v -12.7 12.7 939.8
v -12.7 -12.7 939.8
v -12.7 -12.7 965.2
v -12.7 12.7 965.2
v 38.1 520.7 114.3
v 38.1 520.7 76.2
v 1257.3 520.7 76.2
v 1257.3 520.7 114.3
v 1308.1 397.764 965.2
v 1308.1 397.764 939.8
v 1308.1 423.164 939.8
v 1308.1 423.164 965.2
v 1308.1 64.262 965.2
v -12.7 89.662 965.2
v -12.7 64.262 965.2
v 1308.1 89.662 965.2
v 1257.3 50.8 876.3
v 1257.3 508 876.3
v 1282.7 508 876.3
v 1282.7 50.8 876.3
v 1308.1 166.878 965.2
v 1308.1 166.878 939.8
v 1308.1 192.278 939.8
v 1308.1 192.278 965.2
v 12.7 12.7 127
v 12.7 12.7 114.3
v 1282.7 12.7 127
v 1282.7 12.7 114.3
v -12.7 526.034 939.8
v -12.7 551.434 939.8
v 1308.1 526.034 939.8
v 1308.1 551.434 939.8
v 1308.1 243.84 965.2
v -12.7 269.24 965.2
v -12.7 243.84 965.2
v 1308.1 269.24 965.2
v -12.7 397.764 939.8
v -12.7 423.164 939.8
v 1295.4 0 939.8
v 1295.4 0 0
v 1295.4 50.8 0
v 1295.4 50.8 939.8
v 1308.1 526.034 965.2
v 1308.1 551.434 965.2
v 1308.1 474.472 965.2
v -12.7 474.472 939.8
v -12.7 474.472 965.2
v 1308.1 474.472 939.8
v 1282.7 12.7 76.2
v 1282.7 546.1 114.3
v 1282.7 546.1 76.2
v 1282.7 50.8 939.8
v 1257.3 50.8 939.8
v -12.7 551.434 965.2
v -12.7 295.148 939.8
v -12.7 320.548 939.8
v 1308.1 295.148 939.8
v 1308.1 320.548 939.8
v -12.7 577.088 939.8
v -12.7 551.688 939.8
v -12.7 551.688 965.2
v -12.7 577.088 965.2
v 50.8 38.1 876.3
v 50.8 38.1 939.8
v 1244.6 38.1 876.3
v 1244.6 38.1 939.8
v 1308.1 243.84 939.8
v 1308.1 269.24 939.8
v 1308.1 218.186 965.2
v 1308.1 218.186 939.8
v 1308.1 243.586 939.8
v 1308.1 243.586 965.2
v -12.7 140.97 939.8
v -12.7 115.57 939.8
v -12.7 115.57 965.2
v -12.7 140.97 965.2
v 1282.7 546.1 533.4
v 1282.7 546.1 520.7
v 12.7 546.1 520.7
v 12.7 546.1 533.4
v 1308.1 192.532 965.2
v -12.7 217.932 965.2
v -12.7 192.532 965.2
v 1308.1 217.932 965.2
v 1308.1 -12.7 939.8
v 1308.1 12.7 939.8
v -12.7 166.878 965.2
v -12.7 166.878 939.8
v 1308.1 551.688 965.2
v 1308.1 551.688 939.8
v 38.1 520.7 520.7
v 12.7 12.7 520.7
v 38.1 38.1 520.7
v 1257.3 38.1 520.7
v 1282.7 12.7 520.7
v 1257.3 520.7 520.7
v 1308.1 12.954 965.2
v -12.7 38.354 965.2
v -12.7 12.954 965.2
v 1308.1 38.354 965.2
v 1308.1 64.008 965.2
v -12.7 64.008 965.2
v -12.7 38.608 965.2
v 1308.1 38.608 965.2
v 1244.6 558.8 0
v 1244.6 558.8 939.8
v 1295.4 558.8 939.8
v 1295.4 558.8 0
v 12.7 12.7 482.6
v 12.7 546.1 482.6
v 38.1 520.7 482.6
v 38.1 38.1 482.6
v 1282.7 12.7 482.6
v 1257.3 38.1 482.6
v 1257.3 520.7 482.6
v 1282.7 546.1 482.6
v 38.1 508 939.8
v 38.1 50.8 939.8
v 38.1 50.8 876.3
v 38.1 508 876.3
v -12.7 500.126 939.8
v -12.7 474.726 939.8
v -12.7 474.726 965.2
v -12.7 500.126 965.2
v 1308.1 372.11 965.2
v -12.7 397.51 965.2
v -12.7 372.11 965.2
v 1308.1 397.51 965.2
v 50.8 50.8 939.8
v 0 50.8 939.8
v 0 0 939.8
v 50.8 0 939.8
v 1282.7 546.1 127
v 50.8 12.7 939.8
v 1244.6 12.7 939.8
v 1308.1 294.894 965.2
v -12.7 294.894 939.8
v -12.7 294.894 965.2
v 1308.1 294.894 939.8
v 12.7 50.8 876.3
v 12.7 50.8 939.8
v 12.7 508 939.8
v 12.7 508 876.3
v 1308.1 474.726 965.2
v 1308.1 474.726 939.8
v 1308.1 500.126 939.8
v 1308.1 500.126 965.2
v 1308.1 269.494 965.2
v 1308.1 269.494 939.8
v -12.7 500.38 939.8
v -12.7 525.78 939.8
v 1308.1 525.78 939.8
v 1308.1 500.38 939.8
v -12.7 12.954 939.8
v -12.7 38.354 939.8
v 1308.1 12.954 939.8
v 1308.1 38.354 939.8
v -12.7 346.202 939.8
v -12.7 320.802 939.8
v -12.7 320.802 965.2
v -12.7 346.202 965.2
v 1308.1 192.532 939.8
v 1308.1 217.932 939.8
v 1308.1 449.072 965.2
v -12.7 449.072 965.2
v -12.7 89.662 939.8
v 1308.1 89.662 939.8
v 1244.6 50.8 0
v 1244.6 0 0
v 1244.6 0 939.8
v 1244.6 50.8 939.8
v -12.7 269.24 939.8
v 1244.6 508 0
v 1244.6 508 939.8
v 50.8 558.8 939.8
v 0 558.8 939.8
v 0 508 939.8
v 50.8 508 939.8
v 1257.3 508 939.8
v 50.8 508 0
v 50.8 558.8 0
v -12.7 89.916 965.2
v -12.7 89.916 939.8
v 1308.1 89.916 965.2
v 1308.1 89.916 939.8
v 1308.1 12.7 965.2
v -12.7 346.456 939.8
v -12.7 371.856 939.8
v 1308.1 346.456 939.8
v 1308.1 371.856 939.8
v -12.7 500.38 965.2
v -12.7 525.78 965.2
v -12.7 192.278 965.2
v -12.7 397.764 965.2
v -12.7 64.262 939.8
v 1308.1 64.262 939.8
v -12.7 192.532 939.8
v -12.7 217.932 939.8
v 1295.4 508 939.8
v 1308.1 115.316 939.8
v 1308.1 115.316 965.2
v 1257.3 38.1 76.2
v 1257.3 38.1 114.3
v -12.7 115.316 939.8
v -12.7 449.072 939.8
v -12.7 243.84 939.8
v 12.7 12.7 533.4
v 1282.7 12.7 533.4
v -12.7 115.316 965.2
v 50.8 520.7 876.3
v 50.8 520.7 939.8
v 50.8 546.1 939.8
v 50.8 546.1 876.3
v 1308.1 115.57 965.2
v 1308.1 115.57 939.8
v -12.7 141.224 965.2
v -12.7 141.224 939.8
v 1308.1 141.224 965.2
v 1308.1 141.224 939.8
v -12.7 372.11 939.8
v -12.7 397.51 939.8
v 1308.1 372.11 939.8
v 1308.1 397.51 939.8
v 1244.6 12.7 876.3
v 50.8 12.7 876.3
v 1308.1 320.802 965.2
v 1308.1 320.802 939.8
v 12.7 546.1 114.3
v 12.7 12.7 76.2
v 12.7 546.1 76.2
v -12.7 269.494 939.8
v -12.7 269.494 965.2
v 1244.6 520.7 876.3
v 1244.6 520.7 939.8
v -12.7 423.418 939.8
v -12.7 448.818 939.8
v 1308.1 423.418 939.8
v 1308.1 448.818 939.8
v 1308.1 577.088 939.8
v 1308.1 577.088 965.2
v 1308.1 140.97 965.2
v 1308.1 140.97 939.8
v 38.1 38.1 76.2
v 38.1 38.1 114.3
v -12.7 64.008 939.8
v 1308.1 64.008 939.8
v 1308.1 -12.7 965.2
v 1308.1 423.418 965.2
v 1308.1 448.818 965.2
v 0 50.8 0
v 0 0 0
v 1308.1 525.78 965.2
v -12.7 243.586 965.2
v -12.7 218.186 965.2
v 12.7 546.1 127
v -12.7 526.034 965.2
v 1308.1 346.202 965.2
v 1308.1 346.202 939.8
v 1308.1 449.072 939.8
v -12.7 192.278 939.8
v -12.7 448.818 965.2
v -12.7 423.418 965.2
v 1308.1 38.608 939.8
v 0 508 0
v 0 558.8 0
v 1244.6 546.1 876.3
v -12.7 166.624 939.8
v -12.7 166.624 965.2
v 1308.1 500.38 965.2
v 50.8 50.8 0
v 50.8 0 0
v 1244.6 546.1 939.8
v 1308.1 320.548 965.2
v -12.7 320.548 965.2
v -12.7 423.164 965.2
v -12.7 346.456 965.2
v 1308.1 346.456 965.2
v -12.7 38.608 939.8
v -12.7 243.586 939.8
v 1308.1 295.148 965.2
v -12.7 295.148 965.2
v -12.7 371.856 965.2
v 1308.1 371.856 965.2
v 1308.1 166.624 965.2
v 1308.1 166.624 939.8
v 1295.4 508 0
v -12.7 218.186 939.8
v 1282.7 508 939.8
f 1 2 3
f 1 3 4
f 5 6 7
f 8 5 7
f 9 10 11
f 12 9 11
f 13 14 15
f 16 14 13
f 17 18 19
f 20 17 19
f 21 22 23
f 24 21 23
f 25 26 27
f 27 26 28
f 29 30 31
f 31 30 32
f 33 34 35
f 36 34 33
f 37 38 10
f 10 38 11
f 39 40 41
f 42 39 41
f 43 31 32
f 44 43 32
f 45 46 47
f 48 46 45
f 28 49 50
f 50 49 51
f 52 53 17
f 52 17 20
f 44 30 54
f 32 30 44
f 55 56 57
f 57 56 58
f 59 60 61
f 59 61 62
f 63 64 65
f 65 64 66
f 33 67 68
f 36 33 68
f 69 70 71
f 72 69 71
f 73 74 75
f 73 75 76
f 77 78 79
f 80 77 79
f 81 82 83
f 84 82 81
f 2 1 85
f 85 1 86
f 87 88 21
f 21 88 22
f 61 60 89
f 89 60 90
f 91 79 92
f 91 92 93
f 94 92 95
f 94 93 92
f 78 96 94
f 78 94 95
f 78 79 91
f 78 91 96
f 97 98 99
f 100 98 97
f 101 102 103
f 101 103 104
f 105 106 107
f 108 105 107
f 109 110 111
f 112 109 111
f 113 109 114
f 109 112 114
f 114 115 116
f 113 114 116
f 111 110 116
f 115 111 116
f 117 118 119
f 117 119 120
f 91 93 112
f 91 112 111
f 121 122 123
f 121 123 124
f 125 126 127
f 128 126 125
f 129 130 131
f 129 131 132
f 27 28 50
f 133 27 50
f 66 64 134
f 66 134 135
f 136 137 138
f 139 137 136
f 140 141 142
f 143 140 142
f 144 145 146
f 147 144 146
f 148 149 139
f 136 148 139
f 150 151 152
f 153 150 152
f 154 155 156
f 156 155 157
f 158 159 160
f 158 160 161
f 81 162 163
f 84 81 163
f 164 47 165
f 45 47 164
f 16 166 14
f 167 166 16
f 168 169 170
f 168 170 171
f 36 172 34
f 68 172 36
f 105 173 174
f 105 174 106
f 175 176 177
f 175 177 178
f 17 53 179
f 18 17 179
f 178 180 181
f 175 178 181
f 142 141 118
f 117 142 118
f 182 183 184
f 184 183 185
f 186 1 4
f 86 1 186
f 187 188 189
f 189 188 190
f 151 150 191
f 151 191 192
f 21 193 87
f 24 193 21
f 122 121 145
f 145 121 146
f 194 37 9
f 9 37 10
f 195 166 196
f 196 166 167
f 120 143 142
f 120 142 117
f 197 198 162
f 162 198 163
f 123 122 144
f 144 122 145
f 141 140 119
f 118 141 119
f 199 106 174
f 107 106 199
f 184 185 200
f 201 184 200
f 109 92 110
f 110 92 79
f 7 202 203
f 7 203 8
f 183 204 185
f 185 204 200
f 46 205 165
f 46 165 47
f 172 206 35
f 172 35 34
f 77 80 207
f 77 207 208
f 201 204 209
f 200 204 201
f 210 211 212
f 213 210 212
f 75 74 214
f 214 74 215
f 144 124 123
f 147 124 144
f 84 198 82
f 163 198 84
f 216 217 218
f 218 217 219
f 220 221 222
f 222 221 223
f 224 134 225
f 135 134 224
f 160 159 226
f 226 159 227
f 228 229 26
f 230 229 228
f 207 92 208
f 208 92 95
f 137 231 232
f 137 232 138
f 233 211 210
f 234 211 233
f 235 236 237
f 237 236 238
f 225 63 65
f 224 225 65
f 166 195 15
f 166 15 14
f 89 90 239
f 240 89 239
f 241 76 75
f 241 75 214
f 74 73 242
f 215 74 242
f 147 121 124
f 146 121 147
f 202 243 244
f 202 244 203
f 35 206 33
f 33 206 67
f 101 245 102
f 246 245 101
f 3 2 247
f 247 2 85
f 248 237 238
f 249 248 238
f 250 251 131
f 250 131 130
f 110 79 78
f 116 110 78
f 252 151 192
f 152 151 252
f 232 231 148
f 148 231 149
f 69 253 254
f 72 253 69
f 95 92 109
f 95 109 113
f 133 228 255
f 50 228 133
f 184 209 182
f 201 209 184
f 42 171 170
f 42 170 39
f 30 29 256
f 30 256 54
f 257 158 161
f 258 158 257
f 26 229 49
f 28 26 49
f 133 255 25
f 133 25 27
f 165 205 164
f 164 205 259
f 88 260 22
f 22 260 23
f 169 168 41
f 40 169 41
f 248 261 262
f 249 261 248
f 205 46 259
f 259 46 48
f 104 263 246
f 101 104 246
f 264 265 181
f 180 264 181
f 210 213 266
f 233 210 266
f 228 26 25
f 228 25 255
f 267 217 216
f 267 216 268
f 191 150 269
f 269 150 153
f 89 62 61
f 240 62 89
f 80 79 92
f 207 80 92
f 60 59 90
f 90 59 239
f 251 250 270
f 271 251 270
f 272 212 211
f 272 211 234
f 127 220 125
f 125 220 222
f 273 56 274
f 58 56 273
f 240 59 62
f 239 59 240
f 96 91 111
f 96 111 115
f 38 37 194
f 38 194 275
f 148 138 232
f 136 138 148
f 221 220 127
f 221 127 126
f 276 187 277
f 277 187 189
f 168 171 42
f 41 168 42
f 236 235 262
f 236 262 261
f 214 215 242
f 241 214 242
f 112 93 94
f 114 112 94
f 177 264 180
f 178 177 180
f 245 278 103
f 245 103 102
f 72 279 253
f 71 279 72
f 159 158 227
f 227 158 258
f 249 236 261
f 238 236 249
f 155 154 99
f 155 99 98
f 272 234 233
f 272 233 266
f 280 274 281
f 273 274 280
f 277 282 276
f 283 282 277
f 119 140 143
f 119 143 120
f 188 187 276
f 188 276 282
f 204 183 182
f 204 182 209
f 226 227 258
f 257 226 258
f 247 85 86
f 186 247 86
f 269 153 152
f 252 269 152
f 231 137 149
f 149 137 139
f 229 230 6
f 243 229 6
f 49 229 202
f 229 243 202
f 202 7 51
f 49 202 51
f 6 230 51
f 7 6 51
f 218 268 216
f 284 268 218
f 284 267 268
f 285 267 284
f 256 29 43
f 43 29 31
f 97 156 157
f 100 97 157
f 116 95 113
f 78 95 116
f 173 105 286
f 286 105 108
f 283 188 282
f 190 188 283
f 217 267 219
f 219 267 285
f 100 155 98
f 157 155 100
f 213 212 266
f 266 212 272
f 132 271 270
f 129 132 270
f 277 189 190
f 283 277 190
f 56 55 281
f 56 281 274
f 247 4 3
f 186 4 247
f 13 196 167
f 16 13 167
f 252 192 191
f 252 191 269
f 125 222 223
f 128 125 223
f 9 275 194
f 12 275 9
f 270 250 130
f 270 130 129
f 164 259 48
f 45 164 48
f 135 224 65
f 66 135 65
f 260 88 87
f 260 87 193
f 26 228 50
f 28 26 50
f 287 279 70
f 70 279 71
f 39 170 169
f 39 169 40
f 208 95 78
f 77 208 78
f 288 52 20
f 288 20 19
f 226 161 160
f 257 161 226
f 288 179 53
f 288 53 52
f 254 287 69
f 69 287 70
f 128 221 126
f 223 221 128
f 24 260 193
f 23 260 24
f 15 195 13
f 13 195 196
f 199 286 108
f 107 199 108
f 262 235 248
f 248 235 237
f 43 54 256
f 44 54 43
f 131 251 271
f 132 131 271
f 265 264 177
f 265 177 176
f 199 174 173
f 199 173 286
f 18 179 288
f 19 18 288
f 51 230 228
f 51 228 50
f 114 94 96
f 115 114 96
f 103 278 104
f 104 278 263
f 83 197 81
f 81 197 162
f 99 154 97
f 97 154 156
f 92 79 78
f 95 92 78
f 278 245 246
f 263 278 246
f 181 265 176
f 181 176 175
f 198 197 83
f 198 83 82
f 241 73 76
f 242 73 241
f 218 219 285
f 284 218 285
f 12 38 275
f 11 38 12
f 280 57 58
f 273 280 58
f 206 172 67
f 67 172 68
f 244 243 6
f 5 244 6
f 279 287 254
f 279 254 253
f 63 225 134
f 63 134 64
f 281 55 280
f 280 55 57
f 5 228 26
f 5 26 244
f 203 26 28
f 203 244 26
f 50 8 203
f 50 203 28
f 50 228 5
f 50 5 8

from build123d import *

# Parameters (mm, degrees)
F0_W      = 50.8
F0_H      = 50.8
F1_DEPTH  = 939.8
F2_W      = 1193.8
F2_H      = 25.4
F3_DEPTH  = 63.5
F2_W_2    = 25.4
F2_H_2    = 457.2
F5_W      = 1270
F5_H      = 533.4
F5_W_2    = 1219.2
F5_H_2    = 482.6
F6_DEPTH  = 38.1
F7_W      = 1270
F7_H      = 533.4
F8_DEPTH  = 12.7
F10_W     = 1270
F10_H     = 533.4
F10_W_2   = 1219.2
F10_H_2   = 482.6
F11_DEPTH = 38.1
F13_W     = 1320.8
F13_H     = 25.4
F14_DEPTH = 25.4
F12_W     = 1219.2
F12_H     = 482.6
F15_DEPTH = 12.7


# Not quite as in the source:
# - ends of sketch curves that miss each other by under 0.0002 mm in the source are joined


with BuildPart() as f1:
    # F0 (on Top) → F1 (new body)
    with BuildSketch(Plane.XY):
        with Locations((25.4, 25.4)):
            Rectangle(F0_W, F0_H)
    extrude(amount=F1_DEPTH)


with BuildPart() as f1b:
    # F0 (on Top) → F1, piece 2 (new body)
    with BuildSketch(Plane.XY):
        with Locations((25.4, 533.4)):
            Rectangle(F0_W, F0_H)
    extrude(amount=F1_DEPTH)


with BuildPart() as f1c:
    # F0 (on Top) → F1, piece 3 (new body)
    with BuildSketch(Plane.XY):
        with Locations((1270, 25.4)):
            Rectangle(F0_W, F0_H)
    extrude(amount=F1_DEPTH)


with BuildPart() as f1d:
    # F0 (on Top) → F1, piece 4 (new body)
    with BuildSketch(Plane.XY):
        with Locations((1270, 533.4)):
            Rectangle(F0_W, F0_H)
    extrude(amount=F1_DEPTH)


with BuildPart() as f3:
    # F2 (on face) → F3 (new body)
    with BuildSketch(Plane.XY.offset(939.8)):
        with Locations((647.7, 533.4)):
            Rectangle(F2_W, F2_H)
    extrude(amount=-F3_DEPTH)


with BuildPart() as f3b:
    # F2 (on face) → F3, piece 2 (new body)
    with BuildSketch(Plane.XY.offset(939.8)):
        with Locations((647.7, 25.4)):
            Rectangle(F2_W, F2_H)
    extrude(amount=-F3_DEPTH)


with BuildPart() as f3c:
    # F2 (on face) → F3, piece 3 (new body)
    with BuildSketch(Plane.XY.offset(939.8)):
        with Locations((25.4, 279.4)):
            Rectangle(F2_W_2, F2_H_2)
    extrude(amount=-F3_DEPTH)


with BuildPart() as f3d:
    # F2 (on face) → F3, piece 4 (new body)
    with BuildSketch(Plane.XY.offset(939.8)):
        with Locations((1270, 279.4)):
            Rectangle(F2_W_2, F2_H_2)
    extrude(amount=-F3_DEPTH)


with BuildPart() as f6:
    # F5 (on offset) → F6 (new body)
    with BuildSketch(Plane.XY.offset(76.2)):
        with Locations((647.7, 279.4)):
            Rectangle(F5_W, F5_H)
        with Locations((647.7, 279.4)):
            Rectangle(F5_W_2, F5_H_2, mode=Mode.SUBTRACT)
    extrude(amount=F6_DEPTH)


with BuildPart() as f8:
    # F7 (on face) → F8 (new body)
    with BuildSketch(Plane.XY.offset(114.3)):
        with Locations((647.7, 279.4)):
            Rectangle(F7_W, F7_H)
    extrude(amount=F8_DEPTH)


with BuildPart() as f11:
    # F10 (on offset) → F11 (new body)
    with BuildSketch(Plane.XY.offset(520.7)):
        with Locations((647.7, 279.4)):
            Rectangle(F10_W, F10_H)
        with Locations((647.7, 279.4)):
            Rectangle(F10_W_2, F10_H_2, mode=Mode.SUBTRACT)
    extrude(amount=-F11_DEPTH)


with BuildPart() as f14:
    # F13 (on face) → F14 (new body)
    with BuildSketch(Plane.XY.offset(939.8)):
        with Locations((647.7, 0)):
            Rectangle(F13_W, F13_H)
    extrude(amount=F14_DEPTH)


with BuildPart() as f14b:
    # F13 (on face) → F14, piece 2 (new body)
    with BuildSketch(Plane.XY.offset(939.8)):
        with Locations((647.7, 25.654)):
            Rectangle(F13_W, F13_H)
    extrude(amount=F14_DEPTH)


with BuildPart() as f14c:
    # F13 (on face) → F14, piece 3 (new body)
    with BuildSketch(Plane.XY.offset(939.8)):
        with Locations((647.7, 51.308)):
            Rectangle(F13_W, F13_H)
    extrude(amount=F14_DEPTH)


with BuildPart() as f14d:
    # F13 (on face) → F14, piece 4 (new body)
    with BuildSketch(Plane.XY.offset(939.8)):
        with Locations((647.7, 76.962)):
            Rectangle(F13_W, F13_H)
    extrude(amount=F14_DEPTH)


with BuildPart() as f14e:
    # F13 (on face) → F14, piece 5 (new body)
    with BuildSketch(Plane.XY.offset(939.8)):
        with Locations((647.7, 102.616)):
            Rectangle(F13_W, F13_H)
    extrude(amount=F14_DEPTH)


with BuildPart() as f14f:
    # F13 (on face) → F14, piece 6 (new body)
    with BuildSketch(Plane.XY.offset(939.8)):
        with Locations((647.7, 128.27)):
            Rectangle(F13_W, F13_H)
    extrude(amount=F14_DEPTH)


with BuildPart() as f14g:
    # F13 (on face) → F14, piece 7 (new body)
    with BuildSketch(Plane.XY.offset(939.8)):
        with Locations((647.7, 153.924)):
            Rectangle(F13_W, F13_H)
    extrude(amount=F14_DEPTH)


with BuildPart() as f14h:
    # F13 (on face) → F14, piece 8 (new body)
    with BuildSketch(Plane.XY.offset(939.8)):
        with Locations((647.7, 179.578)):
            Rectangle(F13_W, F13_H)
    extrude(amount=F14_DEPTH)


with BuildPart() as f14i:
    # F13 (on face) → F14, piece 9 (new body)
    with BuildSketch(Plane.XY.offset(939.8)):
        with Locations((647.7, 205.232)):
            Rectangle(F13_W, F13_H)
    extrude(amount=F14_DEPTH)


with BuildPart() as f14j:
    # F13 (on face) → F14, piece 10 (new body)
    with BuildSketch(Plane.XY.offset(939.8)):
        with Locations((647.7, 230.886)):
            Rectangle(F13_W, F13_H)
    extrude(amount=F14_DEPTH)


with BuildPart() as f14k:
    # F13 (on face) → F14, piece 11 (new body)
    with BuildSketch(Plane.XY.offset(939.8)):
        with Locations((647.7, 256.54)):
            Rectangle(F13_W, F13_H)
    extrude(amount=F14_DEPTH)


with BuildPart() as f14l:
    # F13 (on face) → F14, piece 12 (new body)
    with BuildSketch(Plane.XY.offset(939.8)):
        with Locations((647.7, 282.194)):
            Rectangle(F13_W, F13_H)
    extrude(amount=F14_DEPTH)


with BuildPart() as f14m:
    # F13 (on face) → F14, piece 13 (new body)
    with BuildSketch(Plane.XY.offset(939.8)):
        with Locations((647.7, 307.848)):
            Rectangle(F13_W, F13_H)
    extrude(amount=F14_DEPTH)


with BuildPart() as f14n:
    # F13 (on face) → F14, piece 14 (new body)
    with BuildSketch(Plane.XY.offset(939.8)):
        with Locations((647.7, 333.502)):
            Rectangle(F13_W, F13_H)
    extrude(amount=F14_DEPTH)


with BuildPart() as f14o:
    # F13 (on face) → F14, piece 15 (new body)
    with BuildSketch(Plane.XY.offset(939.8)):
        with Locations((647.7, 359.156)):
            Rectangle(F13_W, F13_H)
    extrude(amount=F14_DEPTH)


with BuildPart() as f14p:
    # F13 (on face) → F14, piece 16 (new body)
    with BuildSketch(Plane.XY.offset(939.8)):
        with Locations((647.7, 384.81)):
            Rectangle(F13_W, F13_H)
    extrude(amount=F14_DEPTH)


with BuildPart() as f14q:
    # F13 (on face) → F14, piece 17 (new body)
    with BuildSketch(Plane.XY.offset(939.8)):
        with Locations((647.7, 410.464)):
            Rectangle(F13_W, F13_H)
    extrude(amount=F14_DEPTH)


with BuildPart() as f14r:
    # F13 (on face) → F14, piece 18 (new body)
    with BuildSketch(Plane.XY.offset(939.8)):
        with Locations((647.7, 436.118)):
            Rectangle(F13_W, F13_H)
    extrude(amount=F14_DEPTH)


with BuildPart() as f14s:
    # F13 (on face) → F14, piece 19 (new body)
    with BuildSketch(Plane.XY.offset(939.8)):
        with Locations((647.7, 461.772)):
            Rectangle(F13_W, F13_H)
    extrude(amount=F14_DEPTH)


with BuildPart() as f14t:
    # F13 (on face) → F14, piece 20 (new body)
    with BuildSketch(Plane.XY.offset(939.8)):
        with Locations((647.7, 487.426)):
            Rectangle(F13_W, F13_H)
    extrude(amount=F14_DEPTH)


with BuildPart() as f14u:
    # F13 (on face) → F14, piece 21 (new body)
    with BuildSketch(Plane.XY.offset(939.8)):
        with Locations((647.7, 513.08)):
            Rectangle(F13_W, F13_H)
    extrude(amount=F14_DEPTH)


with BuildPart() as f14v:
    # F13 (on face) → F14, piece 22 (new body)
    with BuildSketch(Plane.XY.offset(939.8)):
        with Locations((647.7, 538.734)):
            Rectangle(F13_W, F13_H)
    extrude(amount=F14_DEPTH)


with BuildPart() as f14w:
    # F13 (on face) → F14, piece 23 (new body)
    with BuildSketch(Plane.XY.offset(939.8)):
        with Locations((647.7, 564.388)):
            Rectangle(F13_W, F13_H)
    extrude(amount=F14_DEPTH)


with BuildPart() as f15:
    # F12 (on face) → F15 (new body)
    with BuildSketch(Plane.XY.offset(520.7)):
        Polygon((1282.7, 546.1), (12.6999995756, 546.1), (12.7, 12.7), (1282.5777116191, 12.7), (1282.7, 12.7), align=None)
        with Locations((647.7, 279.4)):
            Rectangle(F12_W, F12_H, mode=Mode.SUBTRACT)
        with Locations((647.7, 279.4)):
            Rectangle(F12_W, F12_H)
    extrude(amount=F15_DEPTH)


solid = Compound([f1.part, f1b.part, f1c.part, f1d.part, f3.part, f3b.part, f3c.part, f3d.part, f6.part, f8.part, f11.part, f14.part, f14b.part, f14c.part, f14d.part, f14e.part, f14f.part, f14g.part, f14h.part, f14i.part, f14j.part, f14k.part, f14l.part, f14m.part, f14n.part, f14o.part, f14p.part, f14q.part, f14r.part, f14s.part, f14t.part, f14u.part, f14v.part, f14w.part, f15.part])
